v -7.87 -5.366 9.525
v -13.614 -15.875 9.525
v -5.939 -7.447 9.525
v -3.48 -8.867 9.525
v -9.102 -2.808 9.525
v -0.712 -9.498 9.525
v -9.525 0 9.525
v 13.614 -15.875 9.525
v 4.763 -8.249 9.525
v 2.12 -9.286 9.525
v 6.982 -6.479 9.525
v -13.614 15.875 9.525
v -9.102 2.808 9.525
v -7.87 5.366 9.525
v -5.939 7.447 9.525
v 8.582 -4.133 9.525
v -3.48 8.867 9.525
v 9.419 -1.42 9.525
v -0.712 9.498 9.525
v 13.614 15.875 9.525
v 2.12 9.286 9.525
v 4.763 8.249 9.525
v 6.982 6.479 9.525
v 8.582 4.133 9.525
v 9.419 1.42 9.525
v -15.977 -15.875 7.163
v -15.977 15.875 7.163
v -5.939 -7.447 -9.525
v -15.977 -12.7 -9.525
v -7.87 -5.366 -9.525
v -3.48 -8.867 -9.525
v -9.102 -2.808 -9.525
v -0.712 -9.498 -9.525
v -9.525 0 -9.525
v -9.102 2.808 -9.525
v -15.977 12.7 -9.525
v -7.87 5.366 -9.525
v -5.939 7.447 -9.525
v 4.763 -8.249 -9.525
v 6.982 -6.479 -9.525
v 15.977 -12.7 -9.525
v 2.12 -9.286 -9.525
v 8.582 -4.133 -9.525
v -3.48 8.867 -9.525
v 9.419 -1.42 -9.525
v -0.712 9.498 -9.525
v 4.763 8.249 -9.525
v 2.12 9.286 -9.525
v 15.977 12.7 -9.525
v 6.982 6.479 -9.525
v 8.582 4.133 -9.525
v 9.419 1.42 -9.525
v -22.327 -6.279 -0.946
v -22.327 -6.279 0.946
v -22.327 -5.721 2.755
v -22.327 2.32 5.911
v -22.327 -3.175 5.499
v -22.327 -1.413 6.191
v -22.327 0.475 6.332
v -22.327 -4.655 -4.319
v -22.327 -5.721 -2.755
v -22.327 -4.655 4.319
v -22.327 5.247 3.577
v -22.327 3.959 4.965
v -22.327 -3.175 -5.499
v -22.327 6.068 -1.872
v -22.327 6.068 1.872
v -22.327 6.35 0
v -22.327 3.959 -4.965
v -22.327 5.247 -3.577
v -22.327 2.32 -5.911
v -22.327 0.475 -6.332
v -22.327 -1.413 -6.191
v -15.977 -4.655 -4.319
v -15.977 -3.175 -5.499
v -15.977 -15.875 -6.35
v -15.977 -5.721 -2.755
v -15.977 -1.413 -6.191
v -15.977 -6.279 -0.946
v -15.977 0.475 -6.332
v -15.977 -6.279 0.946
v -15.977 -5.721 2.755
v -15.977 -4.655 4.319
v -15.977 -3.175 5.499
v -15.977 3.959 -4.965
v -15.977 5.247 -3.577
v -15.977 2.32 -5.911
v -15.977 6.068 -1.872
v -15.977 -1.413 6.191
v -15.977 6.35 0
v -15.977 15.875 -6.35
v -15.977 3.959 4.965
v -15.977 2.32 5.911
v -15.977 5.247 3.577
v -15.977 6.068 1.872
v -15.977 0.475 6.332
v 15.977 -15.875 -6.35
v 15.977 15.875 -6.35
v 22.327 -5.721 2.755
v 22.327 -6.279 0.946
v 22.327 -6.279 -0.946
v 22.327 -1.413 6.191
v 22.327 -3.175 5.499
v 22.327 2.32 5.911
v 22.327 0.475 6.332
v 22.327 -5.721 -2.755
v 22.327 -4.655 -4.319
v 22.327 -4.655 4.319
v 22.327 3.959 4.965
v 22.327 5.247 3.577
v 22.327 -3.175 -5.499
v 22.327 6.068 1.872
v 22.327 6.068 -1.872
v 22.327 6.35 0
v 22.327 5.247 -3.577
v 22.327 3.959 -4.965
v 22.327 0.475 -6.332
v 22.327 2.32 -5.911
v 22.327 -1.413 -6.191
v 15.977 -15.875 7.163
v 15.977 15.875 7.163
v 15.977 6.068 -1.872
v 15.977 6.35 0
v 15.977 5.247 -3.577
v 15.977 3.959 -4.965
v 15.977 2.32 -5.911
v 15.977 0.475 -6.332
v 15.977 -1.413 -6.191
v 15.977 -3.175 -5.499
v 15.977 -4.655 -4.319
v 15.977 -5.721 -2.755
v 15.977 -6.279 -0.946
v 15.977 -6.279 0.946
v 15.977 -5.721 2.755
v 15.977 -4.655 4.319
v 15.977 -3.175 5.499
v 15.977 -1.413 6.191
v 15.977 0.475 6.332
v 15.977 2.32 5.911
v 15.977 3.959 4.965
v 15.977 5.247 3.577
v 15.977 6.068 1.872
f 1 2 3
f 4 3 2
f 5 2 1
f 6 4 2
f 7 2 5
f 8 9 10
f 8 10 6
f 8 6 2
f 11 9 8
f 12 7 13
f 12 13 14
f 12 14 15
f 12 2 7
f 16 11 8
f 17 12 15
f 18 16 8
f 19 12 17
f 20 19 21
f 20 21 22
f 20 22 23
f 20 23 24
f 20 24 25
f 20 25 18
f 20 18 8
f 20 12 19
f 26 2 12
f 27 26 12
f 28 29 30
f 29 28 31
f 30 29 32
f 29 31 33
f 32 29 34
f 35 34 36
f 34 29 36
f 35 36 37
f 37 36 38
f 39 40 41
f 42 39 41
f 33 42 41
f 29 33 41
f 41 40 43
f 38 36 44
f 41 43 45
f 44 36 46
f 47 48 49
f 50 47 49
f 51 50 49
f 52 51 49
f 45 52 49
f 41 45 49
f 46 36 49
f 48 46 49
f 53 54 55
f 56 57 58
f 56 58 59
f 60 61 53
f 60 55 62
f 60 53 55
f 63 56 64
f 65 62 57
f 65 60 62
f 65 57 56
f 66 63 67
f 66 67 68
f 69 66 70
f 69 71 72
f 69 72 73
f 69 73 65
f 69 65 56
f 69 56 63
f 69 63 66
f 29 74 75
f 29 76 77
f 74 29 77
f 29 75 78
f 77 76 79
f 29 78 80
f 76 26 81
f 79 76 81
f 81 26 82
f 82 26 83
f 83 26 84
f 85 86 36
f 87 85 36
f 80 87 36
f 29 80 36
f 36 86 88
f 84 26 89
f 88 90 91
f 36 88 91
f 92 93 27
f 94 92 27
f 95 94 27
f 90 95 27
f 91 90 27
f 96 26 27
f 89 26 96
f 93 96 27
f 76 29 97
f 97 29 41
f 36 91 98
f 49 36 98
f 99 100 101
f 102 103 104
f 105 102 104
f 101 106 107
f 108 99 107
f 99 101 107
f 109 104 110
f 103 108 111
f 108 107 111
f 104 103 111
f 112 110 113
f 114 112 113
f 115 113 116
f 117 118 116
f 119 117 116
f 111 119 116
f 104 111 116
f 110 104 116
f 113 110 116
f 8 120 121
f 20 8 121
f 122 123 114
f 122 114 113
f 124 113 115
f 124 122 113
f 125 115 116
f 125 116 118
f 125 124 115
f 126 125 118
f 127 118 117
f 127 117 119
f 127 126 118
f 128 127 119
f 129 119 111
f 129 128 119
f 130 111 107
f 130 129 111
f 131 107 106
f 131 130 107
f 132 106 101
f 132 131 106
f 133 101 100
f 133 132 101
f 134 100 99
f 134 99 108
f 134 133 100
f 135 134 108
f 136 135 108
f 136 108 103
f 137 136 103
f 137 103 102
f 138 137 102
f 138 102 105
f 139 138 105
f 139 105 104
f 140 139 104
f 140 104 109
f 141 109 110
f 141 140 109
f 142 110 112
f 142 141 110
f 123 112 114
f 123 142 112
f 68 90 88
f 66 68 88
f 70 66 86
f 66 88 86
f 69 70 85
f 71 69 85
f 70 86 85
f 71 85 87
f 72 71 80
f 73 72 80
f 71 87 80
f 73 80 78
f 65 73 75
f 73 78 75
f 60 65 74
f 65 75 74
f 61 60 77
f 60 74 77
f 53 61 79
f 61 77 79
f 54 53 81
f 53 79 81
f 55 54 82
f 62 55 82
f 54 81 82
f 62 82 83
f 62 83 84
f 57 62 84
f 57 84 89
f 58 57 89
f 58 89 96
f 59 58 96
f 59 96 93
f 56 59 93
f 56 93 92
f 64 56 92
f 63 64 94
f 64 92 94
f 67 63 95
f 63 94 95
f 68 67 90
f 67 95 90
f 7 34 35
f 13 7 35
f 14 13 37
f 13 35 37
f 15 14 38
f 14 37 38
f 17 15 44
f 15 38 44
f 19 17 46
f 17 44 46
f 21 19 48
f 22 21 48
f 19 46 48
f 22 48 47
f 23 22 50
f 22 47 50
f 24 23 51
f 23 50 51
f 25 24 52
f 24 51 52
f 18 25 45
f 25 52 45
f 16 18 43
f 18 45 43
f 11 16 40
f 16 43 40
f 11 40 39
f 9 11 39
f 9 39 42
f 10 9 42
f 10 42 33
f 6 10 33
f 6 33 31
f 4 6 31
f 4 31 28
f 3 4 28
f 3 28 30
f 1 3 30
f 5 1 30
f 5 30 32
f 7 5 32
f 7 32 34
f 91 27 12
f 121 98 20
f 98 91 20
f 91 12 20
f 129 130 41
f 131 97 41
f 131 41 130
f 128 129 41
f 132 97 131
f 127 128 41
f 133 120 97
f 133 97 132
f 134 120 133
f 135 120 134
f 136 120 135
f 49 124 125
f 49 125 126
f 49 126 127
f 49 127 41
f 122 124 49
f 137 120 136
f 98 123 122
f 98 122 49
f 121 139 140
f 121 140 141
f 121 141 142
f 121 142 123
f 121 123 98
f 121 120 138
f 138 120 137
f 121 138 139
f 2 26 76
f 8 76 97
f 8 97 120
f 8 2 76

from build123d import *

# Parameters (mm, degrees)
SKETCH1_W                          = 31.9532
SKETCH1_H                          = 31.75
EXTRUDE1_DEPTH                     = 9.525
SKETCH2_R                          = 6.35
EXTRUDE2_DEPTH                     = 6.35
CHAMFER1_SIZE                      = 3.175
F_3_4_10_ACME_2C_RH_TAPPED_HOLE1_D = 19.05
CHAMFER2_SIZE                      = 2.3622


with BuildPart() as part:
    # Sketch1 → Extrude1 (new body, symmetric)
    with BuildSketch(Plane.XY):
        Rectangle(SKETCH1_W, SKETCH1_H)
    extrude(amount=EXTRUDE1_DEPTH, both=True)

    # Sketch2 → Extrude2 (add)
    with BuildSketch(Plane.ZY.offset(15.9766)):
        with Locations(Location((0, 0, 0), (0, 0, 90))):  # turned: the seam where the file's is
            Circle(SKETCH2_R)
    extrude2 = extrude(amount=EXTRUDE2_DEPTH)

    # Mirror1: Extrude2 across plane
    add(extrude2.mirror(Plane(origin=(0, 0, 0), x_dir=(0, 0, 1), z_dir=(1, 0, 0))))

    # Chamfer1
    chamfer1_edges = [part.edges().sort_by_distance(p)[0] for p in [
        (0, 15.875, -9.525),
        (0, -15.875, -9.525),
    ]]
    chamfer(chamfer1_edges, length=CHAMFER1_SIZE)

    # 3/4-10-ACME-2C-RH Tapped Hole1 (through all)
    with Locations(Plane.XY.offset(9.525)):
        with Locations((0, 0)):
            Hole(F_3_4_10_ACME_2C_RH_TAPPED_HOLE1_D / 2)

    # Chamfer2
    chamfer2_edges = [part.edges().sort_by_distance(p)[0] for p in [
        (15.9766, 0, 9.525),
        (-15.9766, 0, 9.525),
    ]]
    chamfer(chamfer2_edges, length=CHAMFER2_SIZE)


solid = part.part
